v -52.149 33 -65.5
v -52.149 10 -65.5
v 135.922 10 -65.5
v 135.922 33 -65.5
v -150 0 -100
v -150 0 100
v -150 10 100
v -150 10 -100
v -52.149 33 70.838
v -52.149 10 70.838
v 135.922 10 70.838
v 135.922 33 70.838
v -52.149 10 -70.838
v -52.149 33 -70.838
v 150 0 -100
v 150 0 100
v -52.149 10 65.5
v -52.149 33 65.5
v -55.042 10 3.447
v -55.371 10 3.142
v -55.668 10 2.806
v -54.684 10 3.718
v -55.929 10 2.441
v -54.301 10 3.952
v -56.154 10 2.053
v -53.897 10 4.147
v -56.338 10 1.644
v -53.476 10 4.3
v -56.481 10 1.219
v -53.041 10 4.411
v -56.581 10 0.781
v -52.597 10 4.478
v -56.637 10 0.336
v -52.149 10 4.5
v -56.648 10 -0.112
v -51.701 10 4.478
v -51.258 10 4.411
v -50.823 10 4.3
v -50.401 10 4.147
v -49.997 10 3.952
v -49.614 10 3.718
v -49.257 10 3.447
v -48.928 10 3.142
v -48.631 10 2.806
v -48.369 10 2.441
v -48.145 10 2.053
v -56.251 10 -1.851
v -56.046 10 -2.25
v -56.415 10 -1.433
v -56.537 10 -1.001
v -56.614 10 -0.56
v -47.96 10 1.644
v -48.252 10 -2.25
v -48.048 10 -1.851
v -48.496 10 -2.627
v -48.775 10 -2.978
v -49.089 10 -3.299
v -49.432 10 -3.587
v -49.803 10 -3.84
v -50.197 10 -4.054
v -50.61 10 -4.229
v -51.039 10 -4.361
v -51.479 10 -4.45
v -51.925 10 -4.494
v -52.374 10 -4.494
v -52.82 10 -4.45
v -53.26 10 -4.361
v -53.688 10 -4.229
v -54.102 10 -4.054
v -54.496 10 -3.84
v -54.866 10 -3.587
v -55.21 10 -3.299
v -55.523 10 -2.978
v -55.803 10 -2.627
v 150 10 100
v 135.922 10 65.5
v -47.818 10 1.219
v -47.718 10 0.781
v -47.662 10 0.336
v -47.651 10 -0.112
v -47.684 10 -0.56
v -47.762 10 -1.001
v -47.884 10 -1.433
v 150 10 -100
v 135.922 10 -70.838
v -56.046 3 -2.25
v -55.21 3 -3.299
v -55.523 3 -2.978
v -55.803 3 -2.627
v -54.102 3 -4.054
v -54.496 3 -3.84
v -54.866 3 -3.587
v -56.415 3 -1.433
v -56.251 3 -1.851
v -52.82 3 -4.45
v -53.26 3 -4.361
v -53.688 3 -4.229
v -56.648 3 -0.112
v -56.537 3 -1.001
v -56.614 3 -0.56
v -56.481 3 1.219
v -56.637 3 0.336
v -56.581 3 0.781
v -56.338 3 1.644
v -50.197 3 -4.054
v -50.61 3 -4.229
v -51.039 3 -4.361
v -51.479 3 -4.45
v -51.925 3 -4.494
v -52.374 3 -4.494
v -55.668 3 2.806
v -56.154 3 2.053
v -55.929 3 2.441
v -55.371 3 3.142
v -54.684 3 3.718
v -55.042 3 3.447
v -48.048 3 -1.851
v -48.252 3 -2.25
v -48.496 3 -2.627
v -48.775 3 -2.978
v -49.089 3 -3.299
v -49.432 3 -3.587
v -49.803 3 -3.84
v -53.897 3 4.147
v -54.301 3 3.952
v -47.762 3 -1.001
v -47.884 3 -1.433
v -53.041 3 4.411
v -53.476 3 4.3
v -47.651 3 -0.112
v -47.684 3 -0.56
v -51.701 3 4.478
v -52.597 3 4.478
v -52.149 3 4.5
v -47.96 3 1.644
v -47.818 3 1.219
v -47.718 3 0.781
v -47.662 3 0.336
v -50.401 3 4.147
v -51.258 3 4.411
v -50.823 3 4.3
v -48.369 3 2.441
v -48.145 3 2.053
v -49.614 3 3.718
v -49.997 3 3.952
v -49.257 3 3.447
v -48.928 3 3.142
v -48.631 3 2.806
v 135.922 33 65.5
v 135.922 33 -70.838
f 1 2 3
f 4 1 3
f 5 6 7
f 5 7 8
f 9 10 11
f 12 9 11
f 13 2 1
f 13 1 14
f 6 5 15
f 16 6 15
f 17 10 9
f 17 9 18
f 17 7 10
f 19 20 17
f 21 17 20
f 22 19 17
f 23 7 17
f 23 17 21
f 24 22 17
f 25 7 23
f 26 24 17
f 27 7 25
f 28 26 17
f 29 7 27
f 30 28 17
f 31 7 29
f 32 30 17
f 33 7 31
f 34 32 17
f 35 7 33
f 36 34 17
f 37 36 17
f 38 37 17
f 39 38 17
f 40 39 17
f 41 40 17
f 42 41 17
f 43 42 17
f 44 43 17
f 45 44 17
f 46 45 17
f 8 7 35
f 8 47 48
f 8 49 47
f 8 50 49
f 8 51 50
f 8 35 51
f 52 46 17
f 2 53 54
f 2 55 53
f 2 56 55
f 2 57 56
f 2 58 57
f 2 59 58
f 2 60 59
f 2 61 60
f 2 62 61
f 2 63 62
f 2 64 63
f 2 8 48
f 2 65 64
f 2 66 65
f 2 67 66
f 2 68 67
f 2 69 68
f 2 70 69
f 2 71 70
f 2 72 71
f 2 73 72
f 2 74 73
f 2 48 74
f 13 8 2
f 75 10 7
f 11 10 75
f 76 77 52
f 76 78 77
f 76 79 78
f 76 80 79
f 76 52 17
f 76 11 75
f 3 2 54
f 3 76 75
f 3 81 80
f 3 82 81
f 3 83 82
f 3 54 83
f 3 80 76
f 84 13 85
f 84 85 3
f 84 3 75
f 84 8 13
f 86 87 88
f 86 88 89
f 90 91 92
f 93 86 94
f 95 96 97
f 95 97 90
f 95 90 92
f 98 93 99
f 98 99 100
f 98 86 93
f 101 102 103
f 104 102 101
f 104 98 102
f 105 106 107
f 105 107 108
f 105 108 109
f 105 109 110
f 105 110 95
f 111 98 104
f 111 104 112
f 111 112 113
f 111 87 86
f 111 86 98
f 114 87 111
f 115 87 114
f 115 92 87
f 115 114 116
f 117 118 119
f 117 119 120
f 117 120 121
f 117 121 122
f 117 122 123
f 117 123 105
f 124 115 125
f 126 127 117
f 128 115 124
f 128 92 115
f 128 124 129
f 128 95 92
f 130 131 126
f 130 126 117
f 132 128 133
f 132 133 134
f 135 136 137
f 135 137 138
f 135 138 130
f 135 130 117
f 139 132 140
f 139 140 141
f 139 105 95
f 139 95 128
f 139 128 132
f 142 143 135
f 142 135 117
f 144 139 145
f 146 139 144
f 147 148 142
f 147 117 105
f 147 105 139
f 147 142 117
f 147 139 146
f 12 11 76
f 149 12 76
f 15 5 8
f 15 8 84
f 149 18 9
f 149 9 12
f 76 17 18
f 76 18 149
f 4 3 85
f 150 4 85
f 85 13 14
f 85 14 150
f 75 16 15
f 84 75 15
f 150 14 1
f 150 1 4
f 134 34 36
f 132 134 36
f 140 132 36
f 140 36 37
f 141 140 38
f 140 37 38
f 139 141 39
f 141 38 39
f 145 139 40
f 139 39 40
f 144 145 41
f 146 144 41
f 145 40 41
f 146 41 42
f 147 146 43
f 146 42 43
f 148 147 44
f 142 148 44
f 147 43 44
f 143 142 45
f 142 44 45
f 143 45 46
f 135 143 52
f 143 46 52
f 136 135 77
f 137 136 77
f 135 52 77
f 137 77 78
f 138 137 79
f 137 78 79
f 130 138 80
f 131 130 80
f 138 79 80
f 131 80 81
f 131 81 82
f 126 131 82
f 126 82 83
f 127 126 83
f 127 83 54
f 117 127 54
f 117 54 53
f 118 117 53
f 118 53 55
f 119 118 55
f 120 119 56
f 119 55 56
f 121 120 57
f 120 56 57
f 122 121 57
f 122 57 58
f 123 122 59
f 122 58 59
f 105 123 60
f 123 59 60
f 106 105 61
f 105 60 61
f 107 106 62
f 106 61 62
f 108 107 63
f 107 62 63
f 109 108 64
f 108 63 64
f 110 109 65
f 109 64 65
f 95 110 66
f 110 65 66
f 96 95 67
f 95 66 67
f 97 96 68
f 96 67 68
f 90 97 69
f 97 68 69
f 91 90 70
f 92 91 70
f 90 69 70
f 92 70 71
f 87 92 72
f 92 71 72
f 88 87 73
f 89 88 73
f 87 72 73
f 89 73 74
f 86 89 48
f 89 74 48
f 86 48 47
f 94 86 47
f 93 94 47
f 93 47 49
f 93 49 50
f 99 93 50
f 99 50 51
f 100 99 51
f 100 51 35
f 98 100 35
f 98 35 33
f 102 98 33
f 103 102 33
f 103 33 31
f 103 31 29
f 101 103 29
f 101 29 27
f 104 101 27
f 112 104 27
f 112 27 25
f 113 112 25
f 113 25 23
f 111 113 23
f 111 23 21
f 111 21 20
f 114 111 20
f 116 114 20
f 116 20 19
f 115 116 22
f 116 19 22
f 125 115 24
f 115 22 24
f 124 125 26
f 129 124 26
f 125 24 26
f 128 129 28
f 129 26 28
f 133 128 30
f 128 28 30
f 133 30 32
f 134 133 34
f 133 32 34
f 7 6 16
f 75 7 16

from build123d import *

# Parameters (mm, degrees)
SKETCH1_W           = 300
SKETCH1_H           = 200
BOSS_EXTRUDE1_DEPTH = 10
SKETCH2_R           = 4.5
CUT_EXTRUDE1_DEPTH  = 7
SKETCH3_W           = 188.071582903
SKETCH3_H           = 5.337669468
BOSS_EXTRUDE2_DEPTH = 30


with BuildPart() as part:
    # Sketch1 → Boss-Extrude1 (new body)
    with BuildSketch(Plane(origin=(0, 0, 0), x_dir=(1, 0, 0), z_dir=(0, 1, 0))):
        Rectangle(SKETCH1_W, SKETCH1_H)
    extrude(amount=BOSS_EXTRUDE1_DEPTH)

    # Sketch2 → Cut-Extrude1 (cut)
    with BuildSketch(Plane(origin=(0, 10, 0), x_dir=(1, 0, 0), z_dir=(0, 1, 0))):
        with Locations(Location((-52.149355232, 0, 0), (0, 0, 270))):
            Circle(SKETCH2_R)
    extrude(amount=-CUT_EXTRUDE1_DEPTH, mode=Mode.SUBTRACT)

    # Sketch3 → Boss-Extrude2 (add)
    with BuildSketch(Plane(origin=(0, 3, 0), x_dir=(1, 0, 0), z_dir=(0, 1, 0))):
        with Locations((41.886436219, -68.168834734)):
            Rectangle(SKETCH3_W, SKETCH3_H)
        with Locations((41.886436219, 68.168834734)):
            Rectangle(SKETCH3_W, SKETCH3_H)
    extrude(amount=BOSS_EXTRUDE2_DEPTH)


solid = part.part
